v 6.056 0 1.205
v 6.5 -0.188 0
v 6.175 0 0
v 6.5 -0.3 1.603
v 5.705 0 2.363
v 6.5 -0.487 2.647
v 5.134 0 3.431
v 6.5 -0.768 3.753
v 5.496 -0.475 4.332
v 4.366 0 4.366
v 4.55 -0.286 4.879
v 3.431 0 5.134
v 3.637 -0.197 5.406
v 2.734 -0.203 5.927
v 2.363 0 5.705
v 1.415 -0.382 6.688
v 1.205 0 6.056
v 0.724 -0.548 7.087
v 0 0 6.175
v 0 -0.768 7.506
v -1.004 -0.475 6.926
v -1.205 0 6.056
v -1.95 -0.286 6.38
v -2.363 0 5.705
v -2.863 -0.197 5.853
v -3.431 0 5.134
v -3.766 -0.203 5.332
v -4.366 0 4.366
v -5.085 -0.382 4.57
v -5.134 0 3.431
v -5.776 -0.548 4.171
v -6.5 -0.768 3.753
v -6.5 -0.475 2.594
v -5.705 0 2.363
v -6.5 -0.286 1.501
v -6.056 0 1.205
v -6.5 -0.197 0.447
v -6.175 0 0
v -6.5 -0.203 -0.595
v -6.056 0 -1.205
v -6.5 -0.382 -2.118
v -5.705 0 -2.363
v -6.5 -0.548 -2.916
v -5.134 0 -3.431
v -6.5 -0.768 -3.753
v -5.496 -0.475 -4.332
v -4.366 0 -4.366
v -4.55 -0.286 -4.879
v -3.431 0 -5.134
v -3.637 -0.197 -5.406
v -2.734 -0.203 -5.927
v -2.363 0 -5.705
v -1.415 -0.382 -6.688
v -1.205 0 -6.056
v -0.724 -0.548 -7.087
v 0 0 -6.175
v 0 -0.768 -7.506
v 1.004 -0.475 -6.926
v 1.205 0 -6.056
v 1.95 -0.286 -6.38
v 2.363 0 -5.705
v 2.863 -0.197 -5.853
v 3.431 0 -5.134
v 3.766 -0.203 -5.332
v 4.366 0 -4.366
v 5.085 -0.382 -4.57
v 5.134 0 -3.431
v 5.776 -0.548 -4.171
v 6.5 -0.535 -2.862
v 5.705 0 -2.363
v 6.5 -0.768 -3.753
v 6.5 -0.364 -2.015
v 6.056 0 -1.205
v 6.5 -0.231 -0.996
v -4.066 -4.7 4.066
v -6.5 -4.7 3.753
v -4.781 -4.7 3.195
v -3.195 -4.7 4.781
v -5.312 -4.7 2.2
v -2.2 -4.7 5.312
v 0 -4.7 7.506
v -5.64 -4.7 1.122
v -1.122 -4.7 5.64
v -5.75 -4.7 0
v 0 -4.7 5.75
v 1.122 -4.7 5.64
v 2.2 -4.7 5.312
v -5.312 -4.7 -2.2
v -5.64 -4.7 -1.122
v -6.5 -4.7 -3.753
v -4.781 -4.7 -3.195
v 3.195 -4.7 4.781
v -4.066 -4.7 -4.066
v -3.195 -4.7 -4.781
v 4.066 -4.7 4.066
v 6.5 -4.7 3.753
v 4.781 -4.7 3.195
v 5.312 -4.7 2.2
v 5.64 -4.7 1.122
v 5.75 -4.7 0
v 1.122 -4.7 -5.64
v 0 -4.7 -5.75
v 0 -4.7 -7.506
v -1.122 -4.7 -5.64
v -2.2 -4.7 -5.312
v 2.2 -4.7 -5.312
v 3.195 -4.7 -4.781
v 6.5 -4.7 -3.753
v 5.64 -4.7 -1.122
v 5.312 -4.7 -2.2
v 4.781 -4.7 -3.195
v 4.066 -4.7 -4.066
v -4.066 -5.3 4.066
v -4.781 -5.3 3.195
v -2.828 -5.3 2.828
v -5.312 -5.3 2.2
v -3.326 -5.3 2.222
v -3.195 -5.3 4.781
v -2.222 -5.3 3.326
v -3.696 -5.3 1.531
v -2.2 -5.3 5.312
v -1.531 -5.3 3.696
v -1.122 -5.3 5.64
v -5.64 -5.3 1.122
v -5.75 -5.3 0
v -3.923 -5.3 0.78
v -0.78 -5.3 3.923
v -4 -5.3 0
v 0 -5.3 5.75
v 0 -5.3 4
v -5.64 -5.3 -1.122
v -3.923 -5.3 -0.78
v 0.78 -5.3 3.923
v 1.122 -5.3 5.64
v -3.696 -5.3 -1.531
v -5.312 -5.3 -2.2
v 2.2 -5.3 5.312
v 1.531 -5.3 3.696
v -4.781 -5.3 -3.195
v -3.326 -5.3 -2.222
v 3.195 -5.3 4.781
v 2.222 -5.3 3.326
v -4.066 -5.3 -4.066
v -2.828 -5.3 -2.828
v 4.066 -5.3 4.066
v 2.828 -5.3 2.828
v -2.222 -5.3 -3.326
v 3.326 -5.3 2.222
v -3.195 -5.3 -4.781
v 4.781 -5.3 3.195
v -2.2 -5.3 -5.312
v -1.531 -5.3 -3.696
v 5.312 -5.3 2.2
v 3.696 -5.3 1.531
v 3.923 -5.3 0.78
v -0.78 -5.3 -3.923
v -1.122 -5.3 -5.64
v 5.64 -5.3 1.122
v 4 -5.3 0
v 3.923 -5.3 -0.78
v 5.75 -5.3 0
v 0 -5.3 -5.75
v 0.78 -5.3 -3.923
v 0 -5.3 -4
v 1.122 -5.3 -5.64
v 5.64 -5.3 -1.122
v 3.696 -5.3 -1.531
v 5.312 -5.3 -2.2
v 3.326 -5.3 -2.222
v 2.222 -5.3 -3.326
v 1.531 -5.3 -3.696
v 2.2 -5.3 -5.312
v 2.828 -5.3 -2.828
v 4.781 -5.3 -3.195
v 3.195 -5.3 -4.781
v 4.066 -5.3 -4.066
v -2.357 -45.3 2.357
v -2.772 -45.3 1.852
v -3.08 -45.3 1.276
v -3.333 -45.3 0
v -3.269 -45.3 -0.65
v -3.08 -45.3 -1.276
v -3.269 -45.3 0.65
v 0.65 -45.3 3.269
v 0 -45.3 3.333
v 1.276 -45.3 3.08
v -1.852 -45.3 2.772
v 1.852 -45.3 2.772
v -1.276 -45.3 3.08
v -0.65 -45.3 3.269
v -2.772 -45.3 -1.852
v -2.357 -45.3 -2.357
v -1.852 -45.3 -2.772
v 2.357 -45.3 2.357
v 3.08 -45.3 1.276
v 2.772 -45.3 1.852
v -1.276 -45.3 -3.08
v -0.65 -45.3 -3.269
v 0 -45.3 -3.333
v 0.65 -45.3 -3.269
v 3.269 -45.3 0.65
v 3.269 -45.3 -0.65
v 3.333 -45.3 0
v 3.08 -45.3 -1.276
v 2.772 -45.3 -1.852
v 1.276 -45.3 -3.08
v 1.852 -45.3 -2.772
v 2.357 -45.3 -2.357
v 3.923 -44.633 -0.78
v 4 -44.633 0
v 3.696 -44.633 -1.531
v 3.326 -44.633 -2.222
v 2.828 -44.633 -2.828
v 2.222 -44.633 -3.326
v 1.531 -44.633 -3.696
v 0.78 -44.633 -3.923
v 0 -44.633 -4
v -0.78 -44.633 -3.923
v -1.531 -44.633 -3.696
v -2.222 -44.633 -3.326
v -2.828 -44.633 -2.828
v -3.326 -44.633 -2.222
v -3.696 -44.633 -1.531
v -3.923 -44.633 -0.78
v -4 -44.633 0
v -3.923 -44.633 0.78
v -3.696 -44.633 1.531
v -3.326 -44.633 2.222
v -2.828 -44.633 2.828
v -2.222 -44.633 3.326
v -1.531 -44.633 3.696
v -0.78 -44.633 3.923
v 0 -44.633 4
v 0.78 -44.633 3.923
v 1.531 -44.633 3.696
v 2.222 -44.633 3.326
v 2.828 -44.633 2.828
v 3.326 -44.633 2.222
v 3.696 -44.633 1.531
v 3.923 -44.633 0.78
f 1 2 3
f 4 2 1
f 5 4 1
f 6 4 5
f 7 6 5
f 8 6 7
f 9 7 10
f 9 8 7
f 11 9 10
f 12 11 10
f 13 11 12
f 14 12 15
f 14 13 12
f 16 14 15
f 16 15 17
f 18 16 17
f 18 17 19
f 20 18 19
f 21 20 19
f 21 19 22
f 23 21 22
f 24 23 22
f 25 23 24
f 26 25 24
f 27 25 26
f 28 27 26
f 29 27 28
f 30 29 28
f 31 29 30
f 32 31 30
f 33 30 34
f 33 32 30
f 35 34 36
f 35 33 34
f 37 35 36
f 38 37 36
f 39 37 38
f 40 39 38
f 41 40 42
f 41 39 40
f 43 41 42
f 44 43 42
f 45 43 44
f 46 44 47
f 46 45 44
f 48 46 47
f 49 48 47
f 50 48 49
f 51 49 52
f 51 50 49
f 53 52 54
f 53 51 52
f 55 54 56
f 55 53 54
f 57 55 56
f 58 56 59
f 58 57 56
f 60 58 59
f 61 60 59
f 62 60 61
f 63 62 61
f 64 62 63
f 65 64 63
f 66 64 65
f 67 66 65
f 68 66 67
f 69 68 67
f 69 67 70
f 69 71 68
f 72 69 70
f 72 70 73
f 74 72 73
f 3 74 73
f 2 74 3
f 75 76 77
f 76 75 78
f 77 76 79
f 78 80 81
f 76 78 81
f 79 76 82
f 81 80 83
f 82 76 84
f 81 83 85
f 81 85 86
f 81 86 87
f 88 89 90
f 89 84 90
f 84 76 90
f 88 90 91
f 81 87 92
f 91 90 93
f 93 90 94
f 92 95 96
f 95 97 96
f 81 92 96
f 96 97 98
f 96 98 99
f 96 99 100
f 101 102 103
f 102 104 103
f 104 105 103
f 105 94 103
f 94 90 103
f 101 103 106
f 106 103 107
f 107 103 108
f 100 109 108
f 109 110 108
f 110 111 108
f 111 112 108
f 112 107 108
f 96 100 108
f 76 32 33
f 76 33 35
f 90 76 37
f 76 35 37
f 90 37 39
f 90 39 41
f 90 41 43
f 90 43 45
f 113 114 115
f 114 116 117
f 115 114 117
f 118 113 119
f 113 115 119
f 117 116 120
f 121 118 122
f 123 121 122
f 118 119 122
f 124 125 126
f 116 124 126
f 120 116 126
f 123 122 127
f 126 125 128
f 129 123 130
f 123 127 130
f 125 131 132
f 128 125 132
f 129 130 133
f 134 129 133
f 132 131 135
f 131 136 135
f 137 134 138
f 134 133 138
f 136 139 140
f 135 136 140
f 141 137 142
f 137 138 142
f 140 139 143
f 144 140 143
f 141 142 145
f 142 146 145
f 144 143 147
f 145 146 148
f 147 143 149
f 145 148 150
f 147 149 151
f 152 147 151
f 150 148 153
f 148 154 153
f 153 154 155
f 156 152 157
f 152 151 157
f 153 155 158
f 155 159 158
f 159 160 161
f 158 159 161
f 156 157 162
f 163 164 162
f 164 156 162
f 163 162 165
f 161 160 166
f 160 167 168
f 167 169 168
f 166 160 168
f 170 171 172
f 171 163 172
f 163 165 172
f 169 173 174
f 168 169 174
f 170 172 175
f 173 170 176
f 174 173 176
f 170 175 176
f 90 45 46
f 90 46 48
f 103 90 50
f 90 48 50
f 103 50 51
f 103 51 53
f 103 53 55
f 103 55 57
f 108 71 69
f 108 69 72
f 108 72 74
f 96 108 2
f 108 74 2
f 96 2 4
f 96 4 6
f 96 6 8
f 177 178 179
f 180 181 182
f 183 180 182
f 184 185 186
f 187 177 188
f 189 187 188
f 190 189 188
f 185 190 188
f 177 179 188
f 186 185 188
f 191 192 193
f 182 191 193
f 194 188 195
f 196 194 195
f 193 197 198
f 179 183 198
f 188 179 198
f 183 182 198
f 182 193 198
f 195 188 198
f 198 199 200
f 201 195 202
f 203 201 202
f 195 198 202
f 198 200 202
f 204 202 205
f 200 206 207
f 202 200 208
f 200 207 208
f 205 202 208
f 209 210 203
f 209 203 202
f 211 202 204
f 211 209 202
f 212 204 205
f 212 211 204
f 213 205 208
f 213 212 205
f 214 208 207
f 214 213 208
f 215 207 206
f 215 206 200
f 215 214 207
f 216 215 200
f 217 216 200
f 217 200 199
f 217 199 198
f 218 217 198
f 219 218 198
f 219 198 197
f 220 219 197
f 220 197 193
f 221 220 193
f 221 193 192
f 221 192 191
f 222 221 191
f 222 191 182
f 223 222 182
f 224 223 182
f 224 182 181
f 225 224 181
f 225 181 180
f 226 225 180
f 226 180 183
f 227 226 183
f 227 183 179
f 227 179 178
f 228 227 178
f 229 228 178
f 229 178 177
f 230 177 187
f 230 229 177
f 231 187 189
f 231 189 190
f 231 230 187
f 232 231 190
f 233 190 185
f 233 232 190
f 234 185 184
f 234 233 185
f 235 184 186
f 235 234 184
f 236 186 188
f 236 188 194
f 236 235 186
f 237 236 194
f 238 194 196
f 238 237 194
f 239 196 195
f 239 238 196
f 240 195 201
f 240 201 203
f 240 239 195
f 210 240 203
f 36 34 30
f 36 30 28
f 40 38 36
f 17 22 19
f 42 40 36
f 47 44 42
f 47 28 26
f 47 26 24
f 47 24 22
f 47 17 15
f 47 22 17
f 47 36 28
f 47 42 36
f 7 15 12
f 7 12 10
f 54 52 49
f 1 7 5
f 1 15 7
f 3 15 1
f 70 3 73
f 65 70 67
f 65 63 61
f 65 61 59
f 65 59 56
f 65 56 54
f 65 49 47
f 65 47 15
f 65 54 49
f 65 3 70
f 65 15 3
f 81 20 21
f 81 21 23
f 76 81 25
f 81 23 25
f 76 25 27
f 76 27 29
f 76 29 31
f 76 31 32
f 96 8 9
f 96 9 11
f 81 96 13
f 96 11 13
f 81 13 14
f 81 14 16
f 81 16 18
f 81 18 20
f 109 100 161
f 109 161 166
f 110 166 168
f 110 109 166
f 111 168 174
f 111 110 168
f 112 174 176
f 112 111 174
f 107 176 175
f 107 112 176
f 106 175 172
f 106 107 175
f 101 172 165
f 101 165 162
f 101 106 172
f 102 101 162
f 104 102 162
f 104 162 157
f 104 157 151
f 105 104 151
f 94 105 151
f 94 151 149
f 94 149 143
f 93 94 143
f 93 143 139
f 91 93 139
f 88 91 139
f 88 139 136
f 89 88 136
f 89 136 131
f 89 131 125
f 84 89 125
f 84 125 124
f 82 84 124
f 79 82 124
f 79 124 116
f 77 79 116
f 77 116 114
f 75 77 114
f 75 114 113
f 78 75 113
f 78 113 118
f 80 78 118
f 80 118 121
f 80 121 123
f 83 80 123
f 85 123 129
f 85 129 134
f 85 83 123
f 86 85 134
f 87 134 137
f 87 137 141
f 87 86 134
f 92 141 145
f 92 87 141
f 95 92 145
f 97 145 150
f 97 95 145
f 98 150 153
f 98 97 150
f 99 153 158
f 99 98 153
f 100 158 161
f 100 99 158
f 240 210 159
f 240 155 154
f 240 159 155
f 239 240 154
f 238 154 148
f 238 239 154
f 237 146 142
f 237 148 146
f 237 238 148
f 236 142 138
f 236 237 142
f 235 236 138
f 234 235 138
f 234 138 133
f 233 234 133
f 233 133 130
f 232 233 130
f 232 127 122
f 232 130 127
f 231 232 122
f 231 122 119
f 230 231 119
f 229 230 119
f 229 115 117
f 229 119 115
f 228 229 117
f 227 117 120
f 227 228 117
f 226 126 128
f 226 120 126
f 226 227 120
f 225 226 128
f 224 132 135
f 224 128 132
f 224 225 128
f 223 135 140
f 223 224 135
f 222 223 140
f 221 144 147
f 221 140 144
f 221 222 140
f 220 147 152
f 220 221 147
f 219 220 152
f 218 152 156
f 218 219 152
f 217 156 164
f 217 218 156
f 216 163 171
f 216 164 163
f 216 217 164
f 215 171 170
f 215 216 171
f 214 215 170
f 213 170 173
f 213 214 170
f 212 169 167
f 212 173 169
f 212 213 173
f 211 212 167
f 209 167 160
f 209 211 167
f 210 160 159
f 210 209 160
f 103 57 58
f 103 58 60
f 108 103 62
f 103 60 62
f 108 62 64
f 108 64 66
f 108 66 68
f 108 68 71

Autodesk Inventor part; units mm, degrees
ref_plane "YZ Plane" through (0, 0, 0) normal (1, 0, 0) x (0, 1, 0)
ref_plane "XZ Plane" through (0, 0, 0) normal (0, 1, 0) x (-1, 0, 0)
ref_plane "XY Plane" through (0, 0, 0) normal (0, 0, 1) x (1, 0, 0)
sketch "Sketch1" plane through (0, 0, 0) normal (0, 0, 1) x (1, 0, 0)
  line L0 (0, 0) -> (6.175, 0)
  line L1 (9.75, -2.064) -> (9.75, -4.7)
  line L2 (5.75, -5.3) -> (4, -5.3)
  line L3 (4, -5.3) -> (4, -45.3)
  line L4 (4, -45.3) -> (0, -45.3)
  line L5 (0, -45.3) -> (0, 0)
  line L6 (5.75, -5.3) -> (5.75, -4.7)
  line L7 (5.75, -4.7) -> (9.75, -4.7)
  line L8 (6.175, 0) -> (9.75, -2.064)
  dimension "d0" = 19.5
  dimension "d1" = 8
  dimension "d3" = 40
  dimension "d4" = 11.5
  dimension "d5" = 0.6
  dimension "d22" = 30
  dimension "d23" = 12.35
  dimension "d24" = 5.3
revolve "Revolution1" add sketch "Sketch1" angle 360 about axis through (0, -45.3, 0) along (0, 1, 0)
sketch "Sketch2" plane through (0, 0, 0) normal (0, 1, 0) x (1, 0, 0)
  line L0 (0, -7.5056) -> (-6.5, -3.7528)
  line L1 (-6.5, -3.7528) -> (-6.5, 3.7528)
  line L2 (-6.5, 3.7528) -> (0, 7.5056)
  line L3 (0, 7.5056) -> (6.5, 3.7528)
  line L4 (6.5, 3.7528) -> (6.5, -3.7528)
  line L5 (6.5, -3.7528) -> (0, -7.5056)
  circle A0 centre (0, 0) radius 9.75 projected
  point P0 (0, 0)
  point P1 (0, 0)
  dimension "d25" = 13
extrude "Extrusion1" cut sketch "Sketch2" against normal blind 5.3
thread "Thread1" size "M8x1.25" class "6g" standard "ISO Metric profile" length 22
chamfer "Chamfer1" distance 0.6667 angle 45 1 edges at (-4, -45.3, 0)
equation "\"d0\" = 1.5 * S_"
equation "\"d1\" = d1_"
equation "\"d3\" = L"
equation "\"d4\" = dw"
equation "\"d5\" = hw"
equation "\"d23\" = 0.95 * S_"
equation "\"d24\" = k"
equation "\"d14\" = b"
equation "\"d16\" = 0.0833333 * d"
equation "\"d25\" = S_"
equation "\"d26\" = k"
equation "\"d\" = 8"
equation "\"d1_\" = 8"
equation "\"S_\" = 13"
equation "\"k\" = 5.3"
equation "\"e\" = 14.2"
equation "\"L\" = 40"
equation "\"b\" = 22"
equation "\"Grip_Length\" = 18"
equation "\"dw\" = 11.5"
equation "\"hw\" = 0.6"
properties part number "Bolt A M8-6g×40(S13) GOST 7798-70" material "Steel, Mild"
